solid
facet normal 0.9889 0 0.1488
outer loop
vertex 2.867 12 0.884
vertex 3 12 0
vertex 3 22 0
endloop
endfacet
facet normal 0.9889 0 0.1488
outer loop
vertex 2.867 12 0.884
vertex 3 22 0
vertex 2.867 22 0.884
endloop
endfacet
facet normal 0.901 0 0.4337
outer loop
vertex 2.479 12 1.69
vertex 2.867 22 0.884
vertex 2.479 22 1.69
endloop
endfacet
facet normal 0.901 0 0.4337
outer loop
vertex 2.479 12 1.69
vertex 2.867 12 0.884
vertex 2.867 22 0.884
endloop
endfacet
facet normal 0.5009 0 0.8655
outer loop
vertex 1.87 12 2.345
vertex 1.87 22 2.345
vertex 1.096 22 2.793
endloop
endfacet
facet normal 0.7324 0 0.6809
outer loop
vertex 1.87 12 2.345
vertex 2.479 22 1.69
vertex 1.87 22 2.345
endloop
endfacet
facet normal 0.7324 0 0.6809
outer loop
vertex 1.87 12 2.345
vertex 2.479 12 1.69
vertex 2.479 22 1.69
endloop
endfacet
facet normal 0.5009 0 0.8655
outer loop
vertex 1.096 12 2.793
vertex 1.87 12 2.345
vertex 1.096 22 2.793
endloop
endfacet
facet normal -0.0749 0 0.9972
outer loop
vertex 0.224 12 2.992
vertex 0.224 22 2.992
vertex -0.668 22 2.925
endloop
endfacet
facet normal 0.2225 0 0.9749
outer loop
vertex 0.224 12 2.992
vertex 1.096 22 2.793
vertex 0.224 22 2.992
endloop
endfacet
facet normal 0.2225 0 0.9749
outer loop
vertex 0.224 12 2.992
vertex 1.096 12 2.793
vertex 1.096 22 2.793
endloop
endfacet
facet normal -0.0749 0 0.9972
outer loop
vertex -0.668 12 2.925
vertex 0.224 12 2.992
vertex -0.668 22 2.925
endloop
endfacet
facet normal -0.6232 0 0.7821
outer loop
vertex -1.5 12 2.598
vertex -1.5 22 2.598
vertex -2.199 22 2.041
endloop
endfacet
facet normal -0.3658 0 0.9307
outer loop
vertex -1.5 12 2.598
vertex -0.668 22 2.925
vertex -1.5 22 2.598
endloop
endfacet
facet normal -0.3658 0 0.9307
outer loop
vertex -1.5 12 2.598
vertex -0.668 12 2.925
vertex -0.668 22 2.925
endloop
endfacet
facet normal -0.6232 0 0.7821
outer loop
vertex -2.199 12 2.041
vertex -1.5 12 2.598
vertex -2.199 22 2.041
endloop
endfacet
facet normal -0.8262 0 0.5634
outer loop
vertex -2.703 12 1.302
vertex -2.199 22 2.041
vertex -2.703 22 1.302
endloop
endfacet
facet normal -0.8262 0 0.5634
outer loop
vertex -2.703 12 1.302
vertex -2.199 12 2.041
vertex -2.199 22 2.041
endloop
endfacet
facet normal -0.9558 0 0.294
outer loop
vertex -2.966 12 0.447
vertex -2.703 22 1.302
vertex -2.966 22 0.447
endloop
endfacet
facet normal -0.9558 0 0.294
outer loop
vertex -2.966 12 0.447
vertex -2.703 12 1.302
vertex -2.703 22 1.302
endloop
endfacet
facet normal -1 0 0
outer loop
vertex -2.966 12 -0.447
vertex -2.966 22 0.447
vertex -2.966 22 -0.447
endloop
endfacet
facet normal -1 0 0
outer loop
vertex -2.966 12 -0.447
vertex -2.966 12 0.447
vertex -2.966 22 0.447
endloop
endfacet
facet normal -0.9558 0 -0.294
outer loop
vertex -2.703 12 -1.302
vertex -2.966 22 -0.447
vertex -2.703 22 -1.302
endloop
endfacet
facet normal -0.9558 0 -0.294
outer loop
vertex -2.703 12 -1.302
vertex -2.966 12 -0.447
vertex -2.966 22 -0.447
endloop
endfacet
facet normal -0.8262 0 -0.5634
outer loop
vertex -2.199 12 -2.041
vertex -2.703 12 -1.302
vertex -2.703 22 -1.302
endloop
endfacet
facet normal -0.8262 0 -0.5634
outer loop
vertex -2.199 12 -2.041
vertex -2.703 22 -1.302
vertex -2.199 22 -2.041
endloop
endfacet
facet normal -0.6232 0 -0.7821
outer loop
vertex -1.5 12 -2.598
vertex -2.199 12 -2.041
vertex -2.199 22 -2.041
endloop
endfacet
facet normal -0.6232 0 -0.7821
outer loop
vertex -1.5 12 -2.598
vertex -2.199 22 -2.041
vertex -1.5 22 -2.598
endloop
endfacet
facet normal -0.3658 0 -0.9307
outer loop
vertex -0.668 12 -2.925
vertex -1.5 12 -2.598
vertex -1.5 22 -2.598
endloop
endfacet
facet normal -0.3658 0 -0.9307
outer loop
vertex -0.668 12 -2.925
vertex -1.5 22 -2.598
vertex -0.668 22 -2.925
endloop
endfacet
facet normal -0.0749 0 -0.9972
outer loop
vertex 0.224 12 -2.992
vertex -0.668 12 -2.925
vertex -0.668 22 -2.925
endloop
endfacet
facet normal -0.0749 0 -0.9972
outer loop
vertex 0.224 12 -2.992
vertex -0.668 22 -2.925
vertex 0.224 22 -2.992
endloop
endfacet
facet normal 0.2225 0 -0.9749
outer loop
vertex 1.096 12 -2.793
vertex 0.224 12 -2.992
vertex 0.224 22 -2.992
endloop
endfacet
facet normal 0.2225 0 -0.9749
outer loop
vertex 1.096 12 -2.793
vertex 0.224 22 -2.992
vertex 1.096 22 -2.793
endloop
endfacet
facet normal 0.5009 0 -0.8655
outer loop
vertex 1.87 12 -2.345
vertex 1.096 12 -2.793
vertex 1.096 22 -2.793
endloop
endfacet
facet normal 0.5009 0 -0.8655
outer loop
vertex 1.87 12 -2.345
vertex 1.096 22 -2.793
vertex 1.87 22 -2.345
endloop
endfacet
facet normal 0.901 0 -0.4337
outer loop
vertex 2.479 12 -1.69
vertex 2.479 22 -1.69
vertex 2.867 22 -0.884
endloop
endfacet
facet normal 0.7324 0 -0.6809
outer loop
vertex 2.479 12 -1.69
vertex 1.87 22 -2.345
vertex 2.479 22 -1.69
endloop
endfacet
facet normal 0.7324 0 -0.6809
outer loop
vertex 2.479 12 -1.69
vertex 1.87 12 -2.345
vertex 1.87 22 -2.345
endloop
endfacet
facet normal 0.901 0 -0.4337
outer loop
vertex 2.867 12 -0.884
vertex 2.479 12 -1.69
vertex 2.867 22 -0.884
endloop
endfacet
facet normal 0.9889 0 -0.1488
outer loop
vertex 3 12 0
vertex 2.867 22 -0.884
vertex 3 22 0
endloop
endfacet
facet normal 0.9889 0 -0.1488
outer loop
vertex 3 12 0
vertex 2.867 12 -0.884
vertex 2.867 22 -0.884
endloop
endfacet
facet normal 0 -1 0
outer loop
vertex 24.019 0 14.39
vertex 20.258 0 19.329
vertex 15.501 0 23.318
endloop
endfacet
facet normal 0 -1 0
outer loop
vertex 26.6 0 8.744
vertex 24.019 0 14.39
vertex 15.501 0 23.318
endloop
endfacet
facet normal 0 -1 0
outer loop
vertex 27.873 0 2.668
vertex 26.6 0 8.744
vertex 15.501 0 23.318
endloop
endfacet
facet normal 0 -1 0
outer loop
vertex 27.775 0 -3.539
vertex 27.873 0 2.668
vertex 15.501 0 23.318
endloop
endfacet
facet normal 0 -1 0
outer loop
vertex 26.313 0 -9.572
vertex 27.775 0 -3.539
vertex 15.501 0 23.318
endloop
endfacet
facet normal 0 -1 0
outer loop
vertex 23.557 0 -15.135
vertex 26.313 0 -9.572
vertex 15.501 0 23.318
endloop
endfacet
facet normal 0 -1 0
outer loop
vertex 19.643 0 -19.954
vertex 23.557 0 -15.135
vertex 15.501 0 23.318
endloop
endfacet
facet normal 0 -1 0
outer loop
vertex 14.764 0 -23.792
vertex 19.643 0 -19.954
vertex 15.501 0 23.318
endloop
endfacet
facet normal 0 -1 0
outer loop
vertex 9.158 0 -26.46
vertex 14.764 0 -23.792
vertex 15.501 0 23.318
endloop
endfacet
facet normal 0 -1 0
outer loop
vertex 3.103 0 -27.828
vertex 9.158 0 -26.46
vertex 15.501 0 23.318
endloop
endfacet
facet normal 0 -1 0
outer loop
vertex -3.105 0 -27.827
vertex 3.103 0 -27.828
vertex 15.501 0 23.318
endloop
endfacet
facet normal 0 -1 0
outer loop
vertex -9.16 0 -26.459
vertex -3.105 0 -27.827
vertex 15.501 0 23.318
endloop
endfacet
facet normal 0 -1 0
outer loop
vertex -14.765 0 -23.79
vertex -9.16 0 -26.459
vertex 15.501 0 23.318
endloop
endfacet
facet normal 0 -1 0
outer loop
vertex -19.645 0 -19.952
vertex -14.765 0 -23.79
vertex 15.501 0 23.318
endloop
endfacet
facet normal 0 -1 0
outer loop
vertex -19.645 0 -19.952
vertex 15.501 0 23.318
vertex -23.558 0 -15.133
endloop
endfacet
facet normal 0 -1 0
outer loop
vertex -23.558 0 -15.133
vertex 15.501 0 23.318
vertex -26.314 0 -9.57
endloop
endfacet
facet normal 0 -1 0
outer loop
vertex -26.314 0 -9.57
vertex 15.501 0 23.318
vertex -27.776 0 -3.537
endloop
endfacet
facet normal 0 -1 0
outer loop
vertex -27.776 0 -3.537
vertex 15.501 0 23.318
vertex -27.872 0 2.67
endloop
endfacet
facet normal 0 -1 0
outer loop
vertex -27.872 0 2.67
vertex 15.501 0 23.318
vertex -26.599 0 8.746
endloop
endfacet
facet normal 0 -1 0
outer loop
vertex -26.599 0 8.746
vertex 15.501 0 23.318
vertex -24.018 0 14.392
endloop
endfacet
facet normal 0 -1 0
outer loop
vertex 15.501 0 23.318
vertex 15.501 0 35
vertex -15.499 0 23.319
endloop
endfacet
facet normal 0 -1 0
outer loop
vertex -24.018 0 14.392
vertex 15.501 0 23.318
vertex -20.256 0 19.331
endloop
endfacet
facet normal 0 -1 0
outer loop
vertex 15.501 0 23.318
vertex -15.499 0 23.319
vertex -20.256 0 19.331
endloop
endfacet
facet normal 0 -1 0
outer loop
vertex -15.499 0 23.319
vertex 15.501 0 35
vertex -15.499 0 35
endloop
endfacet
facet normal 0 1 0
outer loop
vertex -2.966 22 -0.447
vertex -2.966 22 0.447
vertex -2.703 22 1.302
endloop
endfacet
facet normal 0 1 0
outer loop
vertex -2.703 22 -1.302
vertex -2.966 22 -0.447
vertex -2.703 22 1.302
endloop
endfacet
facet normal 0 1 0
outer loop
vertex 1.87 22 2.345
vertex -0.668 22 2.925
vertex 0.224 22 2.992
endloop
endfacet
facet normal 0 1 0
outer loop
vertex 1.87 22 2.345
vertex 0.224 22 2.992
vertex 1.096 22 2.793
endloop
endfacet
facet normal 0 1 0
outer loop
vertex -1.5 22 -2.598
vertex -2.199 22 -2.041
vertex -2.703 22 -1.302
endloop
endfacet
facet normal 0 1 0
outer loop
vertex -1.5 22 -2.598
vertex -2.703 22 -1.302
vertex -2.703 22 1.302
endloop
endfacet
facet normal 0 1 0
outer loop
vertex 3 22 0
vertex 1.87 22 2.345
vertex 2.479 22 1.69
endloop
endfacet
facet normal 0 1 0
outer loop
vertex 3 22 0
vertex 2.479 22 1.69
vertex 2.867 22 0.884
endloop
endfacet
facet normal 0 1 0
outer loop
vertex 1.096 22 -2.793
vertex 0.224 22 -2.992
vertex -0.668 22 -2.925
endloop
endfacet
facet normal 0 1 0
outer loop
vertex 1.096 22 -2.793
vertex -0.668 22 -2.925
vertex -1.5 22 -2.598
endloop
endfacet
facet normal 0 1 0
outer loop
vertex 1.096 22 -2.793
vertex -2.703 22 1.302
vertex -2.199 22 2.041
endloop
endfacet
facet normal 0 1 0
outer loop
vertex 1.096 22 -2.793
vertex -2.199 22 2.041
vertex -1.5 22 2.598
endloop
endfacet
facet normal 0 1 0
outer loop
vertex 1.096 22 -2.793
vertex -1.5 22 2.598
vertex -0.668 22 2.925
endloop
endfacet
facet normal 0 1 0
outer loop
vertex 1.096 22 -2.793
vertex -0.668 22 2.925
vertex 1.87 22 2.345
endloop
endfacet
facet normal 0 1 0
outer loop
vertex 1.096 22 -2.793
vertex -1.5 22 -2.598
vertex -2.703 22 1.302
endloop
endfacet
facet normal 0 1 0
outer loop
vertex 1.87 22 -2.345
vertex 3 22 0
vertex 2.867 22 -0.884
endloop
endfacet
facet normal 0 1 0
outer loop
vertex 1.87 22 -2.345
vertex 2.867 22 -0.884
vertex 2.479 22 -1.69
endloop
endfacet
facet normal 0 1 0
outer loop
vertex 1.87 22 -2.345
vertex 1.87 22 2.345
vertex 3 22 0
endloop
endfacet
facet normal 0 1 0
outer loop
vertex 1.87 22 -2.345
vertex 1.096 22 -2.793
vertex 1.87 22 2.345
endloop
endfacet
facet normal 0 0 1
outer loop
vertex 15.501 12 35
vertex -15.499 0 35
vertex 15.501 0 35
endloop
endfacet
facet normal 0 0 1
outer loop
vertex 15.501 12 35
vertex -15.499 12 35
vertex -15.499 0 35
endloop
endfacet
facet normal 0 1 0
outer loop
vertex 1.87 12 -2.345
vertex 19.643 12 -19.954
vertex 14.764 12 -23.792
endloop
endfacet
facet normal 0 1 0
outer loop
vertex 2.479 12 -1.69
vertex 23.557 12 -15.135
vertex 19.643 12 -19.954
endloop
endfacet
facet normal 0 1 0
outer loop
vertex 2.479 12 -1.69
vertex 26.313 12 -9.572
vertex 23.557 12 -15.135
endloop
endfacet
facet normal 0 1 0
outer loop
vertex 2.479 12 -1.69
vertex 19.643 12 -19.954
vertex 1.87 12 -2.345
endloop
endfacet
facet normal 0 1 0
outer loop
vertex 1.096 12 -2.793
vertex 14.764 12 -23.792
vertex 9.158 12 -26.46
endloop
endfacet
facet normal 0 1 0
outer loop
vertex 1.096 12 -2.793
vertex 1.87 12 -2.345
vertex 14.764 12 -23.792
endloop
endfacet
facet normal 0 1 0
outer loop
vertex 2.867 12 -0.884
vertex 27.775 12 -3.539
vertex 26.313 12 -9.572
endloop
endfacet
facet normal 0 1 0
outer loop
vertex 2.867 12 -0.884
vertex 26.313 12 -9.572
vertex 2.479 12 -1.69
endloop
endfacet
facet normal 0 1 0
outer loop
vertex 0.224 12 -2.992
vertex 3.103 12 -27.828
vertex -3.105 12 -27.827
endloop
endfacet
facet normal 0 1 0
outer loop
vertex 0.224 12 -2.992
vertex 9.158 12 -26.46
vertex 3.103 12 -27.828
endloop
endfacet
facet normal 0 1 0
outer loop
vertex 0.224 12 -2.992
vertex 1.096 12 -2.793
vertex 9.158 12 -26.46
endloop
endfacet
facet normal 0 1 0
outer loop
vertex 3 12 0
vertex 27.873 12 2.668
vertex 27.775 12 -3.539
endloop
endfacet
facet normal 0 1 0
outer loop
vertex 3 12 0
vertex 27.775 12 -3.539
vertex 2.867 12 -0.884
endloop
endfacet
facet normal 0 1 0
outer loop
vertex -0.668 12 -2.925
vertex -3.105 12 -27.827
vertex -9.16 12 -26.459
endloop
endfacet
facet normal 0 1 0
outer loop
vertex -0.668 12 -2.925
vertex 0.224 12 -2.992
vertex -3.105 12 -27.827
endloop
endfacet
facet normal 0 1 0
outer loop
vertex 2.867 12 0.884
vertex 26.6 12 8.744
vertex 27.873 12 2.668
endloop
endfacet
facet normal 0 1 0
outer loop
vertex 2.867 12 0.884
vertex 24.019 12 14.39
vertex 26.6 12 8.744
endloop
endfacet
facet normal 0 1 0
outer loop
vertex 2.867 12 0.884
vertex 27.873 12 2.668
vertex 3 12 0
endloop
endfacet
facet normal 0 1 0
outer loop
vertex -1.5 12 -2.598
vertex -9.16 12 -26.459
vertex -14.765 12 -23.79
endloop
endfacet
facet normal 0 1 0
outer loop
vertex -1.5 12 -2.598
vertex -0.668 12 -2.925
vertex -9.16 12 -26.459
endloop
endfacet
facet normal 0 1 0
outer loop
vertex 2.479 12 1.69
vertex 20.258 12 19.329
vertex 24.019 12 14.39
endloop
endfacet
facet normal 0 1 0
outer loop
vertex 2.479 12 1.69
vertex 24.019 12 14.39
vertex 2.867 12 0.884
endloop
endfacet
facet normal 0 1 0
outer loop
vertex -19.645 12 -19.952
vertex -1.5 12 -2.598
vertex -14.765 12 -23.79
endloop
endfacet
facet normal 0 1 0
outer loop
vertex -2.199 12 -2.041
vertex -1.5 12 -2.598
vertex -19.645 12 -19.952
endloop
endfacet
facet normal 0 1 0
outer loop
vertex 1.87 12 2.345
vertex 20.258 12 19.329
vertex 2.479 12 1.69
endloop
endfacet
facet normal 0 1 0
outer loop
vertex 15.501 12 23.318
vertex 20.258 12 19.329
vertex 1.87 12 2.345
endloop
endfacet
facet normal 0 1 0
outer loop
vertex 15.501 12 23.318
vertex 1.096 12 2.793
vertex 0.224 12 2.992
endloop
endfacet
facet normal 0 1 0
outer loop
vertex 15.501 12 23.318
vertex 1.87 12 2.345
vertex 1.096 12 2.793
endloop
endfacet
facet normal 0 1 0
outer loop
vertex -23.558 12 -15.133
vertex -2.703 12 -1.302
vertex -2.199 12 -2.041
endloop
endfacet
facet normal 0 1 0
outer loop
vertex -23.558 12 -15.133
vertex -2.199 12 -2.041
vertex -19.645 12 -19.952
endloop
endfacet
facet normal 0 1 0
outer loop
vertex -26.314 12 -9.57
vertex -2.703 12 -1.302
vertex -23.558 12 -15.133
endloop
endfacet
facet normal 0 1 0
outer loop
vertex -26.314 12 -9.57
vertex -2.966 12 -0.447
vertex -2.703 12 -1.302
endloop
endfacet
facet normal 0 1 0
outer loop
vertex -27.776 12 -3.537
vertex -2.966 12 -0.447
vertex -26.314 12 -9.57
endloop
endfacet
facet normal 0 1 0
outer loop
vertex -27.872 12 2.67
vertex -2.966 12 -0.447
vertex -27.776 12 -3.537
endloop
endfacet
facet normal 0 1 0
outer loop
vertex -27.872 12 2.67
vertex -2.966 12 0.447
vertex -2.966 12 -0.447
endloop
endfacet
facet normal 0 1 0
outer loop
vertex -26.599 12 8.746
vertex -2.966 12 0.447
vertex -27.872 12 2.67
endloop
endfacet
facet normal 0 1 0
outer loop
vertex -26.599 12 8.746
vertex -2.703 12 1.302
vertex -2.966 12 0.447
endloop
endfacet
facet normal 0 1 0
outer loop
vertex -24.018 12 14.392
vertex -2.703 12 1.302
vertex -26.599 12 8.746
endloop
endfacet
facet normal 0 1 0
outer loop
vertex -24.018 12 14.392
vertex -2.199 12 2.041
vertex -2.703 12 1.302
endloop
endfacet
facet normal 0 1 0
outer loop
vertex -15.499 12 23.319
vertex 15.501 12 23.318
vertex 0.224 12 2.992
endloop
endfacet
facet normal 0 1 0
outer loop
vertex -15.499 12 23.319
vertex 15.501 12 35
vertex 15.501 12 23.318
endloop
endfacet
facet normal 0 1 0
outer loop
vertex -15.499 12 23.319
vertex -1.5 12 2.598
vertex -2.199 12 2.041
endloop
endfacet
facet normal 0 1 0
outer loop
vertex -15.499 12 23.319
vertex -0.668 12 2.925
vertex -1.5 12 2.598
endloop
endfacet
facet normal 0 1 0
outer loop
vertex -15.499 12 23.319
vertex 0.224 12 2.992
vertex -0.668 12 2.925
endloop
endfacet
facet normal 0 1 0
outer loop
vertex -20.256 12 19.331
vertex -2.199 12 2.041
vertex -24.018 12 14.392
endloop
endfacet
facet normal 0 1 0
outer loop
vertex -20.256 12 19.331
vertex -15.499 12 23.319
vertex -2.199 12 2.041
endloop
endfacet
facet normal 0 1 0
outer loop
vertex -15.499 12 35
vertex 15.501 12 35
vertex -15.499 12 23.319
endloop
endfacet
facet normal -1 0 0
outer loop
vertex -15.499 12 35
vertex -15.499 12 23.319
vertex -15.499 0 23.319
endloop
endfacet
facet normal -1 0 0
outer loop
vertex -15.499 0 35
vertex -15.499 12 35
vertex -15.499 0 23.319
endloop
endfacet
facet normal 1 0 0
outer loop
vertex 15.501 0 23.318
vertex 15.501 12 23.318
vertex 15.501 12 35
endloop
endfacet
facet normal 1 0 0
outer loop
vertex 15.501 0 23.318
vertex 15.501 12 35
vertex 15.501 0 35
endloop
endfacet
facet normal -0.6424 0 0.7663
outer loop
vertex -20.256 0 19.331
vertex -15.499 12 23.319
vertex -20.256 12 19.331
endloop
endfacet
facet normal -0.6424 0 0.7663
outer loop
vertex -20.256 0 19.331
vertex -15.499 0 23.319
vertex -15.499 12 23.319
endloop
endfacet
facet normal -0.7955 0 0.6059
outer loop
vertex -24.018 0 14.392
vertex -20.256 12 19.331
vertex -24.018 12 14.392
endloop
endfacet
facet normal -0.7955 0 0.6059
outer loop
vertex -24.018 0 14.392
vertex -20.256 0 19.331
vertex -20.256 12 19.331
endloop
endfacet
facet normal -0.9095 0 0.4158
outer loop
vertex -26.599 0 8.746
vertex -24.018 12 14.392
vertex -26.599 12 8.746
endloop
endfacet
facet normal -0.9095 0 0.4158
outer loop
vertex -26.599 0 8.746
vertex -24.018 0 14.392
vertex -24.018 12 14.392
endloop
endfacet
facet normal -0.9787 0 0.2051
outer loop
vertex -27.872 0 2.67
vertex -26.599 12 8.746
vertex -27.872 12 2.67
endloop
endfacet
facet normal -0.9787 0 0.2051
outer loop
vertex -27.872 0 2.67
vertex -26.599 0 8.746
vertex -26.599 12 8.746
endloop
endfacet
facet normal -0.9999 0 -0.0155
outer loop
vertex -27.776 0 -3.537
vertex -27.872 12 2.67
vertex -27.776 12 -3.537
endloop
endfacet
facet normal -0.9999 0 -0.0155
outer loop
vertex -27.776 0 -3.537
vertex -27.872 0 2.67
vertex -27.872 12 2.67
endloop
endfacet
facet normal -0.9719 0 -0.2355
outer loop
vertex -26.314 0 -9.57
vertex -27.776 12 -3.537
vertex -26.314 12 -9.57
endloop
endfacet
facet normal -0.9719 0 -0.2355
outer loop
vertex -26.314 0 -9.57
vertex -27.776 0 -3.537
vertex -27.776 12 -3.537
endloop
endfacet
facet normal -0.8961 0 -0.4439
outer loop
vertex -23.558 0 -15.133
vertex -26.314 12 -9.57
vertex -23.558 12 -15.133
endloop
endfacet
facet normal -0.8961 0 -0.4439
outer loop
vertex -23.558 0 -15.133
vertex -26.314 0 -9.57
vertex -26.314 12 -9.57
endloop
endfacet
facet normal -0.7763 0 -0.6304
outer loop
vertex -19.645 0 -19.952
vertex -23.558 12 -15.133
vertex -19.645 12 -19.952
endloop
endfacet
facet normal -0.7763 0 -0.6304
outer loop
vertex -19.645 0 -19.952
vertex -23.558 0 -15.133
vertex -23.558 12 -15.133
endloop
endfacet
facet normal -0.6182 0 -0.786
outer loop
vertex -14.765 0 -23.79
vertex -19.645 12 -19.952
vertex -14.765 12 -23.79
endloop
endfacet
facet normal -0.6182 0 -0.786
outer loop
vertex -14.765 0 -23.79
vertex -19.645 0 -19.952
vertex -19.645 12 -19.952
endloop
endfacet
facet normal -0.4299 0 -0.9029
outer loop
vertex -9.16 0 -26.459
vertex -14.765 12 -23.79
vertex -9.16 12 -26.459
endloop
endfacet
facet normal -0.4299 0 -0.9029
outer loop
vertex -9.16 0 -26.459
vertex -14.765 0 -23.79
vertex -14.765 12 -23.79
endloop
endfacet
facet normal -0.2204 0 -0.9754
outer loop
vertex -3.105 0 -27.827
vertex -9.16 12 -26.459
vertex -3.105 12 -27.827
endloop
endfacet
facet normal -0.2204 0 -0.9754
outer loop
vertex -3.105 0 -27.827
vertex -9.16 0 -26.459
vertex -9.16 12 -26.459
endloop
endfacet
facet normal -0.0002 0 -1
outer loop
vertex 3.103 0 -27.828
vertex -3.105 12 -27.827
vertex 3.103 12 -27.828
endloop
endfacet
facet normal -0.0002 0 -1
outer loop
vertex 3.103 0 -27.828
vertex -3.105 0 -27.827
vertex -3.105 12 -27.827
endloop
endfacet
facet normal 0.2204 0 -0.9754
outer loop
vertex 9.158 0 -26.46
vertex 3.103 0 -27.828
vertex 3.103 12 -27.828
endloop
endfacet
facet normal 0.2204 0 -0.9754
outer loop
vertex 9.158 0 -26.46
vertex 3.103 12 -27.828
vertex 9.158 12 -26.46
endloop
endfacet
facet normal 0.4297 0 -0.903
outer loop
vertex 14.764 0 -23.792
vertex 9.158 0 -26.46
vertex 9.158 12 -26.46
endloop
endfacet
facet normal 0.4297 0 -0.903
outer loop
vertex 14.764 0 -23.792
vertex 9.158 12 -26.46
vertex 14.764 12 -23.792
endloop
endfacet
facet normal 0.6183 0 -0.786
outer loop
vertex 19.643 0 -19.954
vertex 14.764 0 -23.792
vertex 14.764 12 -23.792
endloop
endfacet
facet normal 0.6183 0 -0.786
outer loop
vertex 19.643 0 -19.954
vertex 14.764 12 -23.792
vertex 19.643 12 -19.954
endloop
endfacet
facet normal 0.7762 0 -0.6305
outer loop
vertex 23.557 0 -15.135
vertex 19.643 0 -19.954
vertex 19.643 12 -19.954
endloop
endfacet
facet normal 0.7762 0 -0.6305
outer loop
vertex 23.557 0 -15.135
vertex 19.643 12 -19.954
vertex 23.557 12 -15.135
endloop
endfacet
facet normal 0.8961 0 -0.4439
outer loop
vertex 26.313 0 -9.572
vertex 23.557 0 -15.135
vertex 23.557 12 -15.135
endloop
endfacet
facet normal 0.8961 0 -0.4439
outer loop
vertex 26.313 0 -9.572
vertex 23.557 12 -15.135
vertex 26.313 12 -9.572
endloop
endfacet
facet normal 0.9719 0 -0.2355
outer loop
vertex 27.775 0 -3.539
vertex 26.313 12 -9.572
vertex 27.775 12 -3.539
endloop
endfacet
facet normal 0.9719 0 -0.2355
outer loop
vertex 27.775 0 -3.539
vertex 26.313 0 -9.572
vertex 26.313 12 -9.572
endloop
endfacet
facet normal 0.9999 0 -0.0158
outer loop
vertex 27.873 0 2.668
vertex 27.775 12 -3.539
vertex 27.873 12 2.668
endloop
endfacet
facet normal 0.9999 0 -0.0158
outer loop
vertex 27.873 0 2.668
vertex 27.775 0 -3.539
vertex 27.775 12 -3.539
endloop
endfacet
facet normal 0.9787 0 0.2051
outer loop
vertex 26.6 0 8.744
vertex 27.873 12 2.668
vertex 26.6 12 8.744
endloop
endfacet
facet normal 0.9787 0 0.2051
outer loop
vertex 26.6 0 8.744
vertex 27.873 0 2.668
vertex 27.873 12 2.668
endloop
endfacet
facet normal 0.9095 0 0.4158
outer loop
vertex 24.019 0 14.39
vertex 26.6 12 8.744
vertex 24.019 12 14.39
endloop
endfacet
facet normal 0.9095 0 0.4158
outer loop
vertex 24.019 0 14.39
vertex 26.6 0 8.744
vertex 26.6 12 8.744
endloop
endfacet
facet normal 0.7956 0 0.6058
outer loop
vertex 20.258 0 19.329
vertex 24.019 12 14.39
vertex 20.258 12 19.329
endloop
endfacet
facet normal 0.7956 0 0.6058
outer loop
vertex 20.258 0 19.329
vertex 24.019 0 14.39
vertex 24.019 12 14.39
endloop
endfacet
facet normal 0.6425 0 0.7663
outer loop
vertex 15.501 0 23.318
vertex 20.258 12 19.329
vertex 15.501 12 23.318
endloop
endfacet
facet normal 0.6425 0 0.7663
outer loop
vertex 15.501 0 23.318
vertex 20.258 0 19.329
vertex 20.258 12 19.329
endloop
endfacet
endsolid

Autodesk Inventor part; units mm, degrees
ref_plane "YZ Plane" through (0, 0, 0) normal (1, 0, 0) x (0, 1, 0)
ref_plane "XZ Plane" through (0, 0, 0) normal (0, 1, 0) x (-1, 0, 0)
ref_plane "XY Plane" through (0, 0, 0) normal (0, 0, 1) x (1, 0, 0)
sketch "Sketch1" plane through (0, 0, 0) normal (0, 1, 0) x (-1, 0, 0)
  circle A0 centre (0, 0) radius 28
  dimension "d0" = 56
extrude "Extrusion1" add sketch "Sketch1" along normal blind 12
sketch "Sketch3" plane through (0, 0, 0) normal (0, 0, 1) x (1, 0, 0)
  line L0 (0, 11.8294) -> (-15.4991, 12)
  line L1 (28, 12) -> (-28, 12) projected
  line L2 (-15.4991, 12) -> (-15.4991, -22.0673)
  line L3 (-28, 0) -> (28, 0) projected
  line L4 (-15.4991, 12) -> (15.5009, 12)
  line L5 (15.5009, 12) -> (15.5009, 0)
  line L6 (15.5009, 0) -> (-15.4991, 0)
  line L7 (-15.4991, 0) -> (-15.4991, 12)
  point P0 (0, 0)
  dimension "d5" = 15.5
  dimension "d6" = 31
extrude "Extrusion2" add sketch "Sketch3" along normal blind 35
sketch "Sketch4" plane through (0, 12, 0) normal (0, 1, 0) x (1, 0, 0)
  arc A0 (15.5009, -23.3178) -> (-15.4991, -23.3191) centre (0, 0) ccw projected
  circle A1 centre (0, 0) radius 3
  dimension "d9" = 6
extrude "Extrusion3" add sketch "Sketch4" along normal blind 10
properties part number "Encoder model"
